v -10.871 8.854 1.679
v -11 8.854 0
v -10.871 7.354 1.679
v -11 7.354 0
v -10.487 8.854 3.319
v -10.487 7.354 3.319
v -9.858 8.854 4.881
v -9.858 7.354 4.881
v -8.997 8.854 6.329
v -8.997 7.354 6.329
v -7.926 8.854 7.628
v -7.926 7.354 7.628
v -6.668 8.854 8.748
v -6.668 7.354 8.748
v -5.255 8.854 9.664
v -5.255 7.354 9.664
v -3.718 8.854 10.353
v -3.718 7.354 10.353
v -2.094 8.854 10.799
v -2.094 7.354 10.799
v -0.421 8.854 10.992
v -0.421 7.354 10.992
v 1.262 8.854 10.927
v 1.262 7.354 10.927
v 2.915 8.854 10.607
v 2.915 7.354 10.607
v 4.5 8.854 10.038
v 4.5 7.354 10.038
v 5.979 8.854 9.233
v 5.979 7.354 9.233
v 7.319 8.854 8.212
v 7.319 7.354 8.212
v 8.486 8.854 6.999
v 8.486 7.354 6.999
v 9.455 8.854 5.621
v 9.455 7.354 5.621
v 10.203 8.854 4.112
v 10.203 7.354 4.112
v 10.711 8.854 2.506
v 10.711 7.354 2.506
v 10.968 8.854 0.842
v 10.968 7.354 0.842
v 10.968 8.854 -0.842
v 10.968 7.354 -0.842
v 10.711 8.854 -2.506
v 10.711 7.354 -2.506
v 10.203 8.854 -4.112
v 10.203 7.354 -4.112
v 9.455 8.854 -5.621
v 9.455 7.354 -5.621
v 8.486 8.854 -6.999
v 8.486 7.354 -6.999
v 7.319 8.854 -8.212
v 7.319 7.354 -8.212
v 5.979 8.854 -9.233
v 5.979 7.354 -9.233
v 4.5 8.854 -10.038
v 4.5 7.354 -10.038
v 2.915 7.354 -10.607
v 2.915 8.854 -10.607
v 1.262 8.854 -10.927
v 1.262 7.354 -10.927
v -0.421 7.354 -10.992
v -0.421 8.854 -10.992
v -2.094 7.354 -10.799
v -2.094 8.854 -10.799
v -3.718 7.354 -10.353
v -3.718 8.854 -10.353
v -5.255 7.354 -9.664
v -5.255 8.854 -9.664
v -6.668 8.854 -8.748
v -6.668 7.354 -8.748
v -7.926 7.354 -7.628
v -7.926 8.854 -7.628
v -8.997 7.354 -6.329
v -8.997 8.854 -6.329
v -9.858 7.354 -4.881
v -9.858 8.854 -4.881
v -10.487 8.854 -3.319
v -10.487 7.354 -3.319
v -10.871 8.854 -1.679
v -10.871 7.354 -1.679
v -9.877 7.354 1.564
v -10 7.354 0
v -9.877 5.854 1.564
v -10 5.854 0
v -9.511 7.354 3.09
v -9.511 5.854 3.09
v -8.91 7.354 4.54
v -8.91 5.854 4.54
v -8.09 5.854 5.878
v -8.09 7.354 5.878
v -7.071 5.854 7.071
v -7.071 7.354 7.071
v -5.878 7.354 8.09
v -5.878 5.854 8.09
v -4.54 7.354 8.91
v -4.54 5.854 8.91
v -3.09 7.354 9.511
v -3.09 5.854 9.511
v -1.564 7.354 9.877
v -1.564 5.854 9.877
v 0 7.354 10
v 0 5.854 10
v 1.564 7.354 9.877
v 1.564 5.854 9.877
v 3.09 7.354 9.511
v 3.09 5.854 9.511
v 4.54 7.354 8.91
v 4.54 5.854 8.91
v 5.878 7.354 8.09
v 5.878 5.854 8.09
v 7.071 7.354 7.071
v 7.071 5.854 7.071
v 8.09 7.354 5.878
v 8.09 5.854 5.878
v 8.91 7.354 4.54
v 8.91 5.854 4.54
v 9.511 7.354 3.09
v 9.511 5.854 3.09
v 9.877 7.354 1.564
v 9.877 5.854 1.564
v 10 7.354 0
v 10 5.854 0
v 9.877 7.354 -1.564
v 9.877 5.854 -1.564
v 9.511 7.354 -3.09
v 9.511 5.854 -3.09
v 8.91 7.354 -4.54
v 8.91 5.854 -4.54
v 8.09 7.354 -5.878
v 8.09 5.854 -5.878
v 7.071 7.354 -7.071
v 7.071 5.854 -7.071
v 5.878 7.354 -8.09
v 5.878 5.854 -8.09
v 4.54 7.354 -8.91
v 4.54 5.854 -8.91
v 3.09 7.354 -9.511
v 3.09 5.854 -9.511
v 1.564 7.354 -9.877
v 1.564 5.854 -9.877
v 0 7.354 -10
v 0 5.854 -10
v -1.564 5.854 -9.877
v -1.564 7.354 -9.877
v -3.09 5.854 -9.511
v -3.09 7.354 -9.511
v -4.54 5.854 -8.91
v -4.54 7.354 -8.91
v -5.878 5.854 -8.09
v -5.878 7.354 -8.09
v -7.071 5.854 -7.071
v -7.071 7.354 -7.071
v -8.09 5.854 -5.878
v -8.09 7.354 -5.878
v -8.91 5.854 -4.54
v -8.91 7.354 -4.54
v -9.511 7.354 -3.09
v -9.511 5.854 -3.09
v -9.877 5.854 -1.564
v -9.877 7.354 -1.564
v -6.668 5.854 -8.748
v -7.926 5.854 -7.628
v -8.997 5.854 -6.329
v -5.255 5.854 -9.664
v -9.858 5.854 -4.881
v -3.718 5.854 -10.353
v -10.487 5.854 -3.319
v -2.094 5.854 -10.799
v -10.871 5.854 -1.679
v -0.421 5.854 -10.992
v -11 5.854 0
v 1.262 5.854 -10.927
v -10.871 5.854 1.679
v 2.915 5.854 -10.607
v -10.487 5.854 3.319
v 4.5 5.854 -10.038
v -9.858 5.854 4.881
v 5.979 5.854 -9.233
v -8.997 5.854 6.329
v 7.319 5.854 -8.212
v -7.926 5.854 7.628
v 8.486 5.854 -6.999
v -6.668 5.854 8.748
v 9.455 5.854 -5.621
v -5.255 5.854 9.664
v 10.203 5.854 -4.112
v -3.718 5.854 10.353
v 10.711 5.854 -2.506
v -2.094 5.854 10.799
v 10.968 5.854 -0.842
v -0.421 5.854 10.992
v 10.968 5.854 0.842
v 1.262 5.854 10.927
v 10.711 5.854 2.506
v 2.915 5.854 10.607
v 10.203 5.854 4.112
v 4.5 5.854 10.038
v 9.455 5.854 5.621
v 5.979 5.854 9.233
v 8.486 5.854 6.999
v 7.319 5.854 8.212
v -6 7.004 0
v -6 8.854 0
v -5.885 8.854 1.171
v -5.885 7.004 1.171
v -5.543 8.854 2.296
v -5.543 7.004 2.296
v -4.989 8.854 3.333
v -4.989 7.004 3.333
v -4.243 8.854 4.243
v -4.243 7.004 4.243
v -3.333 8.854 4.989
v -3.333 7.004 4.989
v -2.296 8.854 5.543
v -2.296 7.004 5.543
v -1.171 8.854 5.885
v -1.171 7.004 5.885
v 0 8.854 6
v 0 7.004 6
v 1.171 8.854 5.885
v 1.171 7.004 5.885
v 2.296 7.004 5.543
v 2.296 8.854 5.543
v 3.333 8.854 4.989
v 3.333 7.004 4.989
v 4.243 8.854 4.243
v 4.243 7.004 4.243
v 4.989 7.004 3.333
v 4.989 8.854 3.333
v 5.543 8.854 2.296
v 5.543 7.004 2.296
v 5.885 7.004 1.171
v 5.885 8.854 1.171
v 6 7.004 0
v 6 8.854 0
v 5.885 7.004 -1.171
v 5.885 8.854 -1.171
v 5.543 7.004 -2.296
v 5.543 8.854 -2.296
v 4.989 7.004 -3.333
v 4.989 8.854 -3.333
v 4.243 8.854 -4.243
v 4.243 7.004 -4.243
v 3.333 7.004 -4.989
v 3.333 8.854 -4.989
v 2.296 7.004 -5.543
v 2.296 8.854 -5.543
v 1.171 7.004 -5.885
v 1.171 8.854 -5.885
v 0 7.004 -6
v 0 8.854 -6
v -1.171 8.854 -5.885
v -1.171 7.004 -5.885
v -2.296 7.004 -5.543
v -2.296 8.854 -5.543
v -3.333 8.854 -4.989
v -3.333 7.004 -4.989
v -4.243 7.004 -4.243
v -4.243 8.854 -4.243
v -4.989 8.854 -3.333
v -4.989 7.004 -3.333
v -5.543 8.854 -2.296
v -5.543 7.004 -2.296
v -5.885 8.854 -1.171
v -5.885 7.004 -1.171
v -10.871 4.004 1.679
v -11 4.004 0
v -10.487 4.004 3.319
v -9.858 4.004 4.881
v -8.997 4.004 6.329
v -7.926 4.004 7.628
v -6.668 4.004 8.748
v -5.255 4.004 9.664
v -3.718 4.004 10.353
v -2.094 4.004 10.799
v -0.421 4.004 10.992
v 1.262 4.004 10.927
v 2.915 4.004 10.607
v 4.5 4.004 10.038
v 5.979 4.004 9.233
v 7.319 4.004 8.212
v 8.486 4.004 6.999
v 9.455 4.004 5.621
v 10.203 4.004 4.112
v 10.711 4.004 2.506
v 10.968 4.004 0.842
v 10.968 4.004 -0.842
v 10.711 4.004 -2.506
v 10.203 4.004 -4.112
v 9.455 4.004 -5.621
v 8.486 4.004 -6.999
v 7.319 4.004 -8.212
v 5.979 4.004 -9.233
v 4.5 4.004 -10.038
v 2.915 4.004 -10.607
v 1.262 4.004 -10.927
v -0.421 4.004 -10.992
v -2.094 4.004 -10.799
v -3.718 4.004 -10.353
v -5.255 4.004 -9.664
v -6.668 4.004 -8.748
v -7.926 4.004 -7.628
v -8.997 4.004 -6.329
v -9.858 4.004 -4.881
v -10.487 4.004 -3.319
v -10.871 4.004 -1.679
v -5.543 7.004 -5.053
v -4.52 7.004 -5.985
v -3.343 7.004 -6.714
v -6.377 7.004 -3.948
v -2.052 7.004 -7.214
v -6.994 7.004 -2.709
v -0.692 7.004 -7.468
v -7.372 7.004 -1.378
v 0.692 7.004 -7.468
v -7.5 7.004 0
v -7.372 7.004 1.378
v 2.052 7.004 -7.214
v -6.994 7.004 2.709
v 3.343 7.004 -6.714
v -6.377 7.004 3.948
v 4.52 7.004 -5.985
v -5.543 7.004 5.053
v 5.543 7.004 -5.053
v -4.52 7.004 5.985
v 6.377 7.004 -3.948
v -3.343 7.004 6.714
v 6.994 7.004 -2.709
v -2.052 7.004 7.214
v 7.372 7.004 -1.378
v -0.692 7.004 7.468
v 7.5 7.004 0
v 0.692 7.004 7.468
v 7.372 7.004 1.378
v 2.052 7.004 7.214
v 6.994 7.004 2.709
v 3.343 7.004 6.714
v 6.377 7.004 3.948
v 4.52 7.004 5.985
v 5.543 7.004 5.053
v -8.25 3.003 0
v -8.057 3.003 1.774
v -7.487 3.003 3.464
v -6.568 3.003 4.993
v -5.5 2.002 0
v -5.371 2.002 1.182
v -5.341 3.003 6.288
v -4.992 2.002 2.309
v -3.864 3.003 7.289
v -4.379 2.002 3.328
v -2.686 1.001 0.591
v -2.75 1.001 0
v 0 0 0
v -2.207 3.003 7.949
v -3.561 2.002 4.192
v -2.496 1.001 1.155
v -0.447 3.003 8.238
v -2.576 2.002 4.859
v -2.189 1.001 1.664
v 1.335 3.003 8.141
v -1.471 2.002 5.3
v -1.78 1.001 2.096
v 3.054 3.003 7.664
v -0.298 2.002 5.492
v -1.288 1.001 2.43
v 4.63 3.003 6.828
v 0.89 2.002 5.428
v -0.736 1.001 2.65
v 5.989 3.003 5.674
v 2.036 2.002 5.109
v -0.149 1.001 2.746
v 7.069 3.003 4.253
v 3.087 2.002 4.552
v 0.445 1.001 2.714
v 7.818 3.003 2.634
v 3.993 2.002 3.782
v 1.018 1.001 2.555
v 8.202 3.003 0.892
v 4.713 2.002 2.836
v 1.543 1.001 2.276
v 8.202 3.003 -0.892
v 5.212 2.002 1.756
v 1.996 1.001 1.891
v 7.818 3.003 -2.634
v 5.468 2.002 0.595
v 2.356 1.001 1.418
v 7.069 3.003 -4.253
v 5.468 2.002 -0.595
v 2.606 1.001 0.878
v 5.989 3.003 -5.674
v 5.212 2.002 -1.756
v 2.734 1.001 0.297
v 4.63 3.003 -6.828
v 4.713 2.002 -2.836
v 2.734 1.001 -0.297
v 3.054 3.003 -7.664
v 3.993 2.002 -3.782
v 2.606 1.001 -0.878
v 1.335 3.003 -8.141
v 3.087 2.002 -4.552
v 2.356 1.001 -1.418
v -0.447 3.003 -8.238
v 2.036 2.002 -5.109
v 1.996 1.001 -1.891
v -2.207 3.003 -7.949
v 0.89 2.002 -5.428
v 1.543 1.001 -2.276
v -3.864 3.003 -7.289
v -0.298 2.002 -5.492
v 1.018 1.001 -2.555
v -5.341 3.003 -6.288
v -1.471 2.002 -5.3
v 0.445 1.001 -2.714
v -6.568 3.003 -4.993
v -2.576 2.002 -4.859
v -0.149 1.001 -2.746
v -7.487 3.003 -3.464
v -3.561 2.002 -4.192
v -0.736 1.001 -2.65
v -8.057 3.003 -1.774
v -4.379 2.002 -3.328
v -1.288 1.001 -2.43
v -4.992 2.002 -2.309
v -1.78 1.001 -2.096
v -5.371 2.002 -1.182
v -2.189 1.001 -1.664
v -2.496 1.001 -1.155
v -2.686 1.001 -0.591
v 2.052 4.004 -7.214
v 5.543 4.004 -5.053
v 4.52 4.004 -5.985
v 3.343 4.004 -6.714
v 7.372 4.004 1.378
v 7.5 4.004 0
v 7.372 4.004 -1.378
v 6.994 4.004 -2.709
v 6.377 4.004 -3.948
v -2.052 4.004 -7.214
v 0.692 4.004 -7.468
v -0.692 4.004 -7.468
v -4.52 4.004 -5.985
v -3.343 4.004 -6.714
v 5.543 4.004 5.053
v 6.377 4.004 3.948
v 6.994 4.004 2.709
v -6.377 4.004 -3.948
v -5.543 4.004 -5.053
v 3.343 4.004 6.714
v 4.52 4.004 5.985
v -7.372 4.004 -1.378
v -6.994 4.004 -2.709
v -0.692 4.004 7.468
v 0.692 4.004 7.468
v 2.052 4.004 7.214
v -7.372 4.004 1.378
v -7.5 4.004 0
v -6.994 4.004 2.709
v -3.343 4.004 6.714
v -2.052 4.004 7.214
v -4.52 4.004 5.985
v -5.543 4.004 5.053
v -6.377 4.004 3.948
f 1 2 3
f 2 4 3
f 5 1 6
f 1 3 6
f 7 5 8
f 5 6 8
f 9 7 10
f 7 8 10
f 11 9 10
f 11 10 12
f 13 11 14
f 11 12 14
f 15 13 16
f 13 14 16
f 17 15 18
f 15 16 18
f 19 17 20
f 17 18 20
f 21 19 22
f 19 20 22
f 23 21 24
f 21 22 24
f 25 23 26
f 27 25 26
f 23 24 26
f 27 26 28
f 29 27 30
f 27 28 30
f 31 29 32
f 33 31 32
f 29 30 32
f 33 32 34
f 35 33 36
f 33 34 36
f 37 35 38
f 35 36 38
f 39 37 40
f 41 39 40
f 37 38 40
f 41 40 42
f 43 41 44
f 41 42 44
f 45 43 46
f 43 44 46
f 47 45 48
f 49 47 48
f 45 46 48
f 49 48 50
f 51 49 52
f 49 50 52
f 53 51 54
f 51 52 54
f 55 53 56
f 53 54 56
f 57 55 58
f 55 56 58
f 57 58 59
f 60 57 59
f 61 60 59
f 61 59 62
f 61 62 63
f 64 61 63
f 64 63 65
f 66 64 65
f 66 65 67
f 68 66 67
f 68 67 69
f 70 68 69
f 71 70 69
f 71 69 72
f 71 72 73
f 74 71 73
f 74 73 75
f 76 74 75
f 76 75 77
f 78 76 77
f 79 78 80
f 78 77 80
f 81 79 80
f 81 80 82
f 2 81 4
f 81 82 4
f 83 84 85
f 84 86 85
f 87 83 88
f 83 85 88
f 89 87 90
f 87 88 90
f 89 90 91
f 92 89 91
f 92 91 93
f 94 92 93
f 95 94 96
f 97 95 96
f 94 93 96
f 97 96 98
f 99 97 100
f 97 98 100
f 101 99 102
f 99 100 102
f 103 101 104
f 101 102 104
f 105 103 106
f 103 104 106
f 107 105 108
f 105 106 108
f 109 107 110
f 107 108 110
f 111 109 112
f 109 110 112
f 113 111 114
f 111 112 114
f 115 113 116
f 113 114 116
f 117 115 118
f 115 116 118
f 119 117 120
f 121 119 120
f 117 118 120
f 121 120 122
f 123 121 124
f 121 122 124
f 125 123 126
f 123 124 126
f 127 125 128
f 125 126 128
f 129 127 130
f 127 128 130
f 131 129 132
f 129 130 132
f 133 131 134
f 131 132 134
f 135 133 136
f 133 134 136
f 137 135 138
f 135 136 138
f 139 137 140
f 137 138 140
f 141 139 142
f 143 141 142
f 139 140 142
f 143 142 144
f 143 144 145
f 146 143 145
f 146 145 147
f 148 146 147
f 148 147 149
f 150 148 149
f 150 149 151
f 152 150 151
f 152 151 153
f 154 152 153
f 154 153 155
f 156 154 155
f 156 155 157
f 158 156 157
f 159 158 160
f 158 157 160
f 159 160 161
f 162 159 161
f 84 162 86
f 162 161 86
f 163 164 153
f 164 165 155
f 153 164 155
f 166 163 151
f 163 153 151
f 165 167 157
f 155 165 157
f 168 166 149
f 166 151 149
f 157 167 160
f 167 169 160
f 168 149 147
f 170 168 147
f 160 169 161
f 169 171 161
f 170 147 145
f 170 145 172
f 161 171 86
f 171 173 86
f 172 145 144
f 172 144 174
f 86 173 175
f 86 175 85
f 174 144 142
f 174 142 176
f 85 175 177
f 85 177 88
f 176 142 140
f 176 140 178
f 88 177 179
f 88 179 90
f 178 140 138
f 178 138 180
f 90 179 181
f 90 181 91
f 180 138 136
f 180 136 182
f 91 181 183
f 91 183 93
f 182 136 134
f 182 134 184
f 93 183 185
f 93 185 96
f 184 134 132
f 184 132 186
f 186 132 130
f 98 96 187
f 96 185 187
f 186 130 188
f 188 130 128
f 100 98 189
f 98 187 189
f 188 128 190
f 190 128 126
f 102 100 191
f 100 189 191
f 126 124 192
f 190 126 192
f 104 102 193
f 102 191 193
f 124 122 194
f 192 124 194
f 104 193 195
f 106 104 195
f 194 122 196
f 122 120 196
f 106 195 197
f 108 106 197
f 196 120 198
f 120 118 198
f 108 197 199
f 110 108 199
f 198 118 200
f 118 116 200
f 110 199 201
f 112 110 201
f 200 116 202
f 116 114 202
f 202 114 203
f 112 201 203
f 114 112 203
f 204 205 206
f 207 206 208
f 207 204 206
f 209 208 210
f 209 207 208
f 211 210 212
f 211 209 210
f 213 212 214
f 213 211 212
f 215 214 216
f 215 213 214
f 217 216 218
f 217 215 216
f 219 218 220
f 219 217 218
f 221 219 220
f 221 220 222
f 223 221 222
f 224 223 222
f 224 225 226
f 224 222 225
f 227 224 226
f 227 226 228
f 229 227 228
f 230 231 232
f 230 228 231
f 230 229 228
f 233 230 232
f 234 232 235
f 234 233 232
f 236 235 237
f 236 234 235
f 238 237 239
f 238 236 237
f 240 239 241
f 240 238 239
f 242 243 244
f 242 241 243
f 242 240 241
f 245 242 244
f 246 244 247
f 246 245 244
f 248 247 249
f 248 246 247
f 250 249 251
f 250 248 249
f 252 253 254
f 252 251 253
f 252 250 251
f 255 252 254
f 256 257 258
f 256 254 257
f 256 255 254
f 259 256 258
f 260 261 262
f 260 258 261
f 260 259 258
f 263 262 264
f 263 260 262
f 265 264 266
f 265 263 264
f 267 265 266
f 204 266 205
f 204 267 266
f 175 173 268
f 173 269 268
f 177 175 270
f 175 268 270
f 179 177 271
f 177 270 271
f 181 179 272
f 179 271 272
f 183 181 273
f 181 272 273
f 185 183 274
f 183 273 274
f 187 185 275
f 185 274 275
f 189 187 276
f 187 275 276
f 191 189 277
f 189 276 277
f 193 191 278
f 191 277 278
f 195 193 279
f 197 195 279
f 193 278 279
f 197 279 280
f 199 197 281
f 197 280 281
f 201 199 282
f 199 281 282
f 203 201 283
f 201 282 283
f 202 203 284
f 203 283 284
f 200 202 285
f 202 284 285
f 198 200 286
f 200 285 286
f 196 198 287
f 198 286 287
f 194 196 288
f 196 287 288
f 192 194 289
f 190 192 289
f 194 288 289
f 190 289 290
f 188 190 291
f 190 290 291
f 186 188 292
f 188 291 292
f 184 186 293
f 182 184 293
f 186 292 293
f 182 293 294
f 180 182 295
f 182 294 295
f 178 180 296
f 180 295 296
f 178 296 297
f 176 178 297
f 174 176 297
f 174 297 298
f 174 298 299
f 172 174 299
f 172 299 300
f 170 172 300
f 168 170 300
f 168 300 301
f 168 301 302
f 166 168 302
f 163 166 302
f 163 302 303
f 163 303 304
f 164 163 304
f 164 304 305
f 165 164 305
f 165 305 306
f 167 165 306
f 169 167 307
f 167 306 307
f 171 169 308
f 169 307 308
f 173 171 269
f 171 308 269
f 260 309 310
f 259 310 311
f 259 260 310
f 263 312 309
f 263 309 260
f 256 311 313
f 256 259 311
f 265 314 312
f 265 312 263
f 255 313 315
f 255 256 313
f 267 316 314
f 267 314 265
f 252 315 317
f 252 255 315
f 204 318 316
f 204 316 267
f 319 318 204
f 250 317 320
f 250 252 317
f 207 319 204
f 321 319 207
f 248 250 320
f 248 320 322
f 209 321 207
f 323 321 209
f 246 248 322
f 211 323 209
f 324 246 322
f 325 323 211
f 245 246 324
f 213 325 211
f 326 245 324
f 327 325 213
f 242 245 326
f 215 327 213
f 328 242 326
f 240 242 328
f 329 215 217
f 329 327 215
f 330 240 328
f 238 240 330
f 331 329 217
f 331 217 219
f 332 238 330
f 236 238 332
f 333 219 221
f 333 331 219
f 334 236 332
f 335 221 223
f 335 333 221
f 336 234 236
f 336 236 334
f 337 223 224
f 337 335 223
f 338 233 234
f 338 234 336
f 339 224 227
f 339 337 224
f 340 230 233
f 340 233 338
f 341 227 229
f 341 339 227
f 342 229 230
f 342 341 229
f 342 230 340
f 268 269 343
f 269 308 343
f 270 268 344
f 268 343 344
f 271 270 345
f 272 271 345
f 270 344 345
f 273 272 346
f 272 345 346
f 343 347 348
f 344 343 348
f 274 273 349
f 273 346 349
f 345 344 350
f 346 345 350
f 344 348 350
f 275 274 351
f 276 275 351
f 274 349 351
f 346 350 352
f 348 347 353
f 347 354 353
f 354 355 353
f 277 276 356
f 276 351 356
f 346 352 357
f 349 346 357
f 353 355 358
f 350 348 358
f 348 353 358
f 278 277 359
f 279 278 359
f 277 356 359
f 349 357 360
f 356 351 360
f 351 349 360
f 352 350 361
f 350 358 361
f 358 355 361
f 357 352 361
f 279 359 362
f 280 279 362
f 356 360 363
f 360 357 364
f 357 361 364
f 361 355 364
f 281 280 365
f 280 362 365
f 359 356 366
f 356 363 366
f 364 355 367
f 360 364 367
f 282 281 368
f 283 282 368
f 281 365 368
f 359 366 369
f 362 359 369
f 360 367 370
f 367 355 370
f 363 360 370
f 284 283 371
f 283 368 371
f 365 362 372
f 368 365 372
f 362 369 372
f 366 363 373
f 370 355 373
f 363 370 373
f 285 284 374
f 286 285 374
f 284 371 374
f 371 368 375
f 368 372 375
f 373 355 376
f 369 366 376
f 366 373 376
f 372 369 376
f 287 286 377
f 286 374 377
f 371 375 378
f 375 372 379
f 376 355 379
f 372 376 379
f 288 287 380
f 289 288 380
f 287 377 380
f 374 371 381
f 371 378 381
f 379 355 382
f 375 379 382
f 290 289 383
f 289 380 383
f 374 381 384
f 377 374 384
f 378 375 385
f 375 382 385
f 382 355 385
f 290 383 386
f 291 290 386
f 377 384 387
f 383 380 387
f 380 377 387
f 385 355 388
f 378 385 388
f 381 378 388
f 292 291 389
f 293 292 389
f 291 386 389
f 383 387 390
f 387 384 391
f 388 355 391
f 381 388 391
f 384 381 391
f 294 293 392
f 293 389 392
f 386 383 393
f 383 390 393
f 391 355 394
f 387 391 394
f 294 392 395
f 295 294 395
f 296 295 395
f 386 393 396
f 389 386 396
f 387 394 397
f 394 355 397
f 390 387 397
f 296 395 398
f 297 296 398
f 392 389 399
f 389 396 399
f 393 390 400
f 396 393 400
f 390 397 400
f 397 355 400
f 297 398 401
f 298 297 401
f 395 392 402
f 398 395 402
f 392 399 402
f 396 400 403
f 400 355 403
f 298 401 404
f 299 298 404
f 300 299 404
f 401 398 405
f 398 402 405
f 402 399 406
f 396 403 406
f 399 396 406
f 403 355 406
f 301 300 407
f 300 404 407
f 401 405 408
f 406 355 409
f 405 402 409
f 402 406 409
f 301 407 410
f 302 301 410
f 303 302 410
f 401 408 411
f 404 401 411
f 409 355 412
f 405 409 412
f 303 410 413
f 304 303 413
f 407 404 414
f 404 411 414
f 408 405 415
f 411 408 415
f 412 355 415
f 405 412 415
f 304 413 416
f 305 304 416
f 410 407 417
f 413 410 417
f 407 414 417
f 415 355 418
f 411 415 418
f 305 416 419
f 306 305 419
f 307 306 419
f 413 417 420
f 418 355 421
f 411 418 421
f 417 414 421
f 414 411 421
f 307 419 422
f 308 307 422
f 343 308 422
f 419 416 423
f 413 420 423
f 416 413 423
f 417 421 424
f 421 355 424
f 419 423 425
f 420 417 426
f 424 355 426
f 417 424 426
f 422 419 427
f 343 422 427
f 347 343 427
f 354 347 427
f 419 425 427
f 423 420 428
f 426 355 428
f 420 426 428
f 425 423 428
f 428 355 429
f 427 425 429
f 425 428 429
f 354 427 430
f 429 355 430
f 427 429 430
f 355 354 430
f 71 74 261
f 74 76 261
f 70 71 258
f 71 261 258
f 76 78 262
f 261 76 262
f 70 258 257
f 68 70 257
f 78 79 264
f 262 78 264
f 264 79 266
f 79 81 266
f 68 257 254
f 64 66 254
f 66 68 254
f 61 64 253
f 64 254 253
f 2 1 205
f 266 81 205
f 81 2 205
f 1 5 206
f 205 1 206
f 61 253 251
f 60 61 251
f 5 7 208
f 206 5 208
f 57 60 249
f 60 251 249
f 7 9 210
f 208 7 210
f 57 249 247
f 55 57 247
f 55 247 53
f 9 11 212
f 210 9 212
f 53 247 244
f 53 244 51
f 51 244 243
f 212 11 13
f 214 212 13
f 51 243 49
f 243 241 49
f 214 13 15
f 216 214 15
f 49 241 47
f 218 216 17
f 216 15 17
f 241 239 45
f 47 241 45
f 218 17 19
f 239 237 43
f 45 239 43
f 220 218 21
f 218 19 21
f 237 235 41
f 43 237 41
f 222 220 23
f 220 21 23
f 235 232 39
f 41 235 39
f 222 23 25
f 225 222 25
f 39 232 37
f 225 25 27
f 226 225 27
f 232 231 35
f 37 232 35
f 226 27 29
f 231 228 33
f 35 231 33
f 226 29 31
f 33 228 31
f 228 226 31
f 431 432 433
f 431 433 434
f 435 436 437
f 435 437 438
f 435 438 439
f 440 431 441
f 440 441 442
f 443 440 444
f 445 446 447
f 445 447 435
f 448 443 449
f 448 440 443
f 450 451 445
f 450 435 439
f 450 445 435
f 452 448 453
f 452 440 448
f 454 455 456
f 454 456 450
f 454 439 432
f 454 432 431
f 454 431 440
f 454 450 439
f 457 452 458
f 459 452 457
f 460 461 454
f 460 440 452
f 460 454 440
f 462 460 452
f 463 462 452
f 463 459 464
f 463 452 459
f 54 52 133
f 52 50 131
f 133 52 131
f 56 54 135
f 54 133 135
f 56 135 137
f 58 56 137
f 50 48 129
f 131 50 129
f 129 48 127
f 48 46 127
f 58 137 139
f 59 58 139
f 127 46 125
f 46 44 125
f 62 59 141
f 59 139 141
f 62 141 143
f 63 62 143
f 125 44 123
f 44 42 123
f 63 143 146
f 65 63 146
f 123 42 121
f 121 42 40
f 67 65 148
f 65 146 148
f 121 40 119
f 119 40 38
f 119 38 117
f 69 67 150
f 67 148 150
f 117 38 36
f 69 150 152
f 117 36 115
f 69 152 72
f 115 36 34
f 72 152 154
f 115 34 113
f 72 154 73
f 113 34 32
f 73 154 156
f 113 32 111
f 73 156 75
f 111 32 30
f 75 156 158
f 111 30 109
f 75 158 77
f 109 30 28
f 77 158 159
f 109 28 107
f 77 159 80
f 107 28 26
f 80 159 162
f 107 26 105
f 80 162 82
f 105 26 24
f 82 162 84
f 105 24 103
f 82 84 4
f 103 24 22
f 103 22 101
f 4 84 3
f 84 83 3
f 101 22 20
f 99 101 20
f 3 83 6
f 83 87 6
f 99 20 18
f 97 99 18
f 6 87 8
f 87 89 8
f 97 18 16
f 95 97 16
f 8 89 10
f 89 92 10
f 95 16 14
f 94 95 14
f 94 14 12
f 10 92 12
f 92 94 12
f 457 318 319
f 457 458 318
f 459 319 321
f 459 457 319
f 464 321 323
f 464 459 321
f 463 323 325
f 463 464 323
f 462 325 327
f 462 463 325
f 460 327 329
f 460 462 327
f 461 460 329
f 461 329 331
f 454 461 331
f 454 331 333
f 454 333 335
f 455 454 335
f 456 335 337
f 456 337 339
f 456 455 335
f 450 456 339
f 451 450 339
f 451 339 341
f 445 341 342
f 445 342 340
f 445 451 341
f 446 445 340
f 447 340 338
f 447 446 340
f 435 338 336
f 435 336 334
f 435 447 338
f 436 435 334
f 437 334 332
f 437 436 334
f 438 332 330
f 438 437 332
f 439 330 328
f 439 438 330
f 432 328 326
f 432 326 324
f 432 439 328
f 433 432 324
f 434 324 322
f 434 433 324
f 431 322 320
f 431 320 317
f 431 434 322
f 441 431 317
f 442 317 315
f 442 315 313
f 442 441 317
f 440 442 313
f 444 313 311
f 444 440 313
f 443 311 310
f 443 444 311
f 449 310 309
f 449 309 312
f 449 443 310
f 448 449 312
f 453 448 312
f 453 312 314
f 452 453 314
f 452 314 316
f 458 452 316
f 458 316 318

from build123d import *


with BuildPart() as part:
    # Sketch1 → Revolve1 (revolve)
    with BuildSketch(Plane.XY):
        Polygon((0, 0), (0, 8.853672577), (-11, 8.853672577), (-11, 7.353672577), (-10, 7.353672577), (-10, 5.853672577), (-11, 5.853672577), (-11, 4.003672577), align=None)
    revolve(axis=Axis((0, 0, 0), (0, 1, 0)))

    # Sketch2 → Cut-Revolve1 (revolve, cut)
    with BuildSketch(Plane.XY):
        Polygon((0, 4.003672577), (0, 10.003672577), (-6, 10.003672577), (-6, 7.003672577), (-7.5, 7.003672577), (-7.5, 4.003672577), align=None)
    revolve(axis=Axis((0, 4.003672577, 0), (0, 1, 0)), mode=Mode.SUBTRACT)


solid = part.part
